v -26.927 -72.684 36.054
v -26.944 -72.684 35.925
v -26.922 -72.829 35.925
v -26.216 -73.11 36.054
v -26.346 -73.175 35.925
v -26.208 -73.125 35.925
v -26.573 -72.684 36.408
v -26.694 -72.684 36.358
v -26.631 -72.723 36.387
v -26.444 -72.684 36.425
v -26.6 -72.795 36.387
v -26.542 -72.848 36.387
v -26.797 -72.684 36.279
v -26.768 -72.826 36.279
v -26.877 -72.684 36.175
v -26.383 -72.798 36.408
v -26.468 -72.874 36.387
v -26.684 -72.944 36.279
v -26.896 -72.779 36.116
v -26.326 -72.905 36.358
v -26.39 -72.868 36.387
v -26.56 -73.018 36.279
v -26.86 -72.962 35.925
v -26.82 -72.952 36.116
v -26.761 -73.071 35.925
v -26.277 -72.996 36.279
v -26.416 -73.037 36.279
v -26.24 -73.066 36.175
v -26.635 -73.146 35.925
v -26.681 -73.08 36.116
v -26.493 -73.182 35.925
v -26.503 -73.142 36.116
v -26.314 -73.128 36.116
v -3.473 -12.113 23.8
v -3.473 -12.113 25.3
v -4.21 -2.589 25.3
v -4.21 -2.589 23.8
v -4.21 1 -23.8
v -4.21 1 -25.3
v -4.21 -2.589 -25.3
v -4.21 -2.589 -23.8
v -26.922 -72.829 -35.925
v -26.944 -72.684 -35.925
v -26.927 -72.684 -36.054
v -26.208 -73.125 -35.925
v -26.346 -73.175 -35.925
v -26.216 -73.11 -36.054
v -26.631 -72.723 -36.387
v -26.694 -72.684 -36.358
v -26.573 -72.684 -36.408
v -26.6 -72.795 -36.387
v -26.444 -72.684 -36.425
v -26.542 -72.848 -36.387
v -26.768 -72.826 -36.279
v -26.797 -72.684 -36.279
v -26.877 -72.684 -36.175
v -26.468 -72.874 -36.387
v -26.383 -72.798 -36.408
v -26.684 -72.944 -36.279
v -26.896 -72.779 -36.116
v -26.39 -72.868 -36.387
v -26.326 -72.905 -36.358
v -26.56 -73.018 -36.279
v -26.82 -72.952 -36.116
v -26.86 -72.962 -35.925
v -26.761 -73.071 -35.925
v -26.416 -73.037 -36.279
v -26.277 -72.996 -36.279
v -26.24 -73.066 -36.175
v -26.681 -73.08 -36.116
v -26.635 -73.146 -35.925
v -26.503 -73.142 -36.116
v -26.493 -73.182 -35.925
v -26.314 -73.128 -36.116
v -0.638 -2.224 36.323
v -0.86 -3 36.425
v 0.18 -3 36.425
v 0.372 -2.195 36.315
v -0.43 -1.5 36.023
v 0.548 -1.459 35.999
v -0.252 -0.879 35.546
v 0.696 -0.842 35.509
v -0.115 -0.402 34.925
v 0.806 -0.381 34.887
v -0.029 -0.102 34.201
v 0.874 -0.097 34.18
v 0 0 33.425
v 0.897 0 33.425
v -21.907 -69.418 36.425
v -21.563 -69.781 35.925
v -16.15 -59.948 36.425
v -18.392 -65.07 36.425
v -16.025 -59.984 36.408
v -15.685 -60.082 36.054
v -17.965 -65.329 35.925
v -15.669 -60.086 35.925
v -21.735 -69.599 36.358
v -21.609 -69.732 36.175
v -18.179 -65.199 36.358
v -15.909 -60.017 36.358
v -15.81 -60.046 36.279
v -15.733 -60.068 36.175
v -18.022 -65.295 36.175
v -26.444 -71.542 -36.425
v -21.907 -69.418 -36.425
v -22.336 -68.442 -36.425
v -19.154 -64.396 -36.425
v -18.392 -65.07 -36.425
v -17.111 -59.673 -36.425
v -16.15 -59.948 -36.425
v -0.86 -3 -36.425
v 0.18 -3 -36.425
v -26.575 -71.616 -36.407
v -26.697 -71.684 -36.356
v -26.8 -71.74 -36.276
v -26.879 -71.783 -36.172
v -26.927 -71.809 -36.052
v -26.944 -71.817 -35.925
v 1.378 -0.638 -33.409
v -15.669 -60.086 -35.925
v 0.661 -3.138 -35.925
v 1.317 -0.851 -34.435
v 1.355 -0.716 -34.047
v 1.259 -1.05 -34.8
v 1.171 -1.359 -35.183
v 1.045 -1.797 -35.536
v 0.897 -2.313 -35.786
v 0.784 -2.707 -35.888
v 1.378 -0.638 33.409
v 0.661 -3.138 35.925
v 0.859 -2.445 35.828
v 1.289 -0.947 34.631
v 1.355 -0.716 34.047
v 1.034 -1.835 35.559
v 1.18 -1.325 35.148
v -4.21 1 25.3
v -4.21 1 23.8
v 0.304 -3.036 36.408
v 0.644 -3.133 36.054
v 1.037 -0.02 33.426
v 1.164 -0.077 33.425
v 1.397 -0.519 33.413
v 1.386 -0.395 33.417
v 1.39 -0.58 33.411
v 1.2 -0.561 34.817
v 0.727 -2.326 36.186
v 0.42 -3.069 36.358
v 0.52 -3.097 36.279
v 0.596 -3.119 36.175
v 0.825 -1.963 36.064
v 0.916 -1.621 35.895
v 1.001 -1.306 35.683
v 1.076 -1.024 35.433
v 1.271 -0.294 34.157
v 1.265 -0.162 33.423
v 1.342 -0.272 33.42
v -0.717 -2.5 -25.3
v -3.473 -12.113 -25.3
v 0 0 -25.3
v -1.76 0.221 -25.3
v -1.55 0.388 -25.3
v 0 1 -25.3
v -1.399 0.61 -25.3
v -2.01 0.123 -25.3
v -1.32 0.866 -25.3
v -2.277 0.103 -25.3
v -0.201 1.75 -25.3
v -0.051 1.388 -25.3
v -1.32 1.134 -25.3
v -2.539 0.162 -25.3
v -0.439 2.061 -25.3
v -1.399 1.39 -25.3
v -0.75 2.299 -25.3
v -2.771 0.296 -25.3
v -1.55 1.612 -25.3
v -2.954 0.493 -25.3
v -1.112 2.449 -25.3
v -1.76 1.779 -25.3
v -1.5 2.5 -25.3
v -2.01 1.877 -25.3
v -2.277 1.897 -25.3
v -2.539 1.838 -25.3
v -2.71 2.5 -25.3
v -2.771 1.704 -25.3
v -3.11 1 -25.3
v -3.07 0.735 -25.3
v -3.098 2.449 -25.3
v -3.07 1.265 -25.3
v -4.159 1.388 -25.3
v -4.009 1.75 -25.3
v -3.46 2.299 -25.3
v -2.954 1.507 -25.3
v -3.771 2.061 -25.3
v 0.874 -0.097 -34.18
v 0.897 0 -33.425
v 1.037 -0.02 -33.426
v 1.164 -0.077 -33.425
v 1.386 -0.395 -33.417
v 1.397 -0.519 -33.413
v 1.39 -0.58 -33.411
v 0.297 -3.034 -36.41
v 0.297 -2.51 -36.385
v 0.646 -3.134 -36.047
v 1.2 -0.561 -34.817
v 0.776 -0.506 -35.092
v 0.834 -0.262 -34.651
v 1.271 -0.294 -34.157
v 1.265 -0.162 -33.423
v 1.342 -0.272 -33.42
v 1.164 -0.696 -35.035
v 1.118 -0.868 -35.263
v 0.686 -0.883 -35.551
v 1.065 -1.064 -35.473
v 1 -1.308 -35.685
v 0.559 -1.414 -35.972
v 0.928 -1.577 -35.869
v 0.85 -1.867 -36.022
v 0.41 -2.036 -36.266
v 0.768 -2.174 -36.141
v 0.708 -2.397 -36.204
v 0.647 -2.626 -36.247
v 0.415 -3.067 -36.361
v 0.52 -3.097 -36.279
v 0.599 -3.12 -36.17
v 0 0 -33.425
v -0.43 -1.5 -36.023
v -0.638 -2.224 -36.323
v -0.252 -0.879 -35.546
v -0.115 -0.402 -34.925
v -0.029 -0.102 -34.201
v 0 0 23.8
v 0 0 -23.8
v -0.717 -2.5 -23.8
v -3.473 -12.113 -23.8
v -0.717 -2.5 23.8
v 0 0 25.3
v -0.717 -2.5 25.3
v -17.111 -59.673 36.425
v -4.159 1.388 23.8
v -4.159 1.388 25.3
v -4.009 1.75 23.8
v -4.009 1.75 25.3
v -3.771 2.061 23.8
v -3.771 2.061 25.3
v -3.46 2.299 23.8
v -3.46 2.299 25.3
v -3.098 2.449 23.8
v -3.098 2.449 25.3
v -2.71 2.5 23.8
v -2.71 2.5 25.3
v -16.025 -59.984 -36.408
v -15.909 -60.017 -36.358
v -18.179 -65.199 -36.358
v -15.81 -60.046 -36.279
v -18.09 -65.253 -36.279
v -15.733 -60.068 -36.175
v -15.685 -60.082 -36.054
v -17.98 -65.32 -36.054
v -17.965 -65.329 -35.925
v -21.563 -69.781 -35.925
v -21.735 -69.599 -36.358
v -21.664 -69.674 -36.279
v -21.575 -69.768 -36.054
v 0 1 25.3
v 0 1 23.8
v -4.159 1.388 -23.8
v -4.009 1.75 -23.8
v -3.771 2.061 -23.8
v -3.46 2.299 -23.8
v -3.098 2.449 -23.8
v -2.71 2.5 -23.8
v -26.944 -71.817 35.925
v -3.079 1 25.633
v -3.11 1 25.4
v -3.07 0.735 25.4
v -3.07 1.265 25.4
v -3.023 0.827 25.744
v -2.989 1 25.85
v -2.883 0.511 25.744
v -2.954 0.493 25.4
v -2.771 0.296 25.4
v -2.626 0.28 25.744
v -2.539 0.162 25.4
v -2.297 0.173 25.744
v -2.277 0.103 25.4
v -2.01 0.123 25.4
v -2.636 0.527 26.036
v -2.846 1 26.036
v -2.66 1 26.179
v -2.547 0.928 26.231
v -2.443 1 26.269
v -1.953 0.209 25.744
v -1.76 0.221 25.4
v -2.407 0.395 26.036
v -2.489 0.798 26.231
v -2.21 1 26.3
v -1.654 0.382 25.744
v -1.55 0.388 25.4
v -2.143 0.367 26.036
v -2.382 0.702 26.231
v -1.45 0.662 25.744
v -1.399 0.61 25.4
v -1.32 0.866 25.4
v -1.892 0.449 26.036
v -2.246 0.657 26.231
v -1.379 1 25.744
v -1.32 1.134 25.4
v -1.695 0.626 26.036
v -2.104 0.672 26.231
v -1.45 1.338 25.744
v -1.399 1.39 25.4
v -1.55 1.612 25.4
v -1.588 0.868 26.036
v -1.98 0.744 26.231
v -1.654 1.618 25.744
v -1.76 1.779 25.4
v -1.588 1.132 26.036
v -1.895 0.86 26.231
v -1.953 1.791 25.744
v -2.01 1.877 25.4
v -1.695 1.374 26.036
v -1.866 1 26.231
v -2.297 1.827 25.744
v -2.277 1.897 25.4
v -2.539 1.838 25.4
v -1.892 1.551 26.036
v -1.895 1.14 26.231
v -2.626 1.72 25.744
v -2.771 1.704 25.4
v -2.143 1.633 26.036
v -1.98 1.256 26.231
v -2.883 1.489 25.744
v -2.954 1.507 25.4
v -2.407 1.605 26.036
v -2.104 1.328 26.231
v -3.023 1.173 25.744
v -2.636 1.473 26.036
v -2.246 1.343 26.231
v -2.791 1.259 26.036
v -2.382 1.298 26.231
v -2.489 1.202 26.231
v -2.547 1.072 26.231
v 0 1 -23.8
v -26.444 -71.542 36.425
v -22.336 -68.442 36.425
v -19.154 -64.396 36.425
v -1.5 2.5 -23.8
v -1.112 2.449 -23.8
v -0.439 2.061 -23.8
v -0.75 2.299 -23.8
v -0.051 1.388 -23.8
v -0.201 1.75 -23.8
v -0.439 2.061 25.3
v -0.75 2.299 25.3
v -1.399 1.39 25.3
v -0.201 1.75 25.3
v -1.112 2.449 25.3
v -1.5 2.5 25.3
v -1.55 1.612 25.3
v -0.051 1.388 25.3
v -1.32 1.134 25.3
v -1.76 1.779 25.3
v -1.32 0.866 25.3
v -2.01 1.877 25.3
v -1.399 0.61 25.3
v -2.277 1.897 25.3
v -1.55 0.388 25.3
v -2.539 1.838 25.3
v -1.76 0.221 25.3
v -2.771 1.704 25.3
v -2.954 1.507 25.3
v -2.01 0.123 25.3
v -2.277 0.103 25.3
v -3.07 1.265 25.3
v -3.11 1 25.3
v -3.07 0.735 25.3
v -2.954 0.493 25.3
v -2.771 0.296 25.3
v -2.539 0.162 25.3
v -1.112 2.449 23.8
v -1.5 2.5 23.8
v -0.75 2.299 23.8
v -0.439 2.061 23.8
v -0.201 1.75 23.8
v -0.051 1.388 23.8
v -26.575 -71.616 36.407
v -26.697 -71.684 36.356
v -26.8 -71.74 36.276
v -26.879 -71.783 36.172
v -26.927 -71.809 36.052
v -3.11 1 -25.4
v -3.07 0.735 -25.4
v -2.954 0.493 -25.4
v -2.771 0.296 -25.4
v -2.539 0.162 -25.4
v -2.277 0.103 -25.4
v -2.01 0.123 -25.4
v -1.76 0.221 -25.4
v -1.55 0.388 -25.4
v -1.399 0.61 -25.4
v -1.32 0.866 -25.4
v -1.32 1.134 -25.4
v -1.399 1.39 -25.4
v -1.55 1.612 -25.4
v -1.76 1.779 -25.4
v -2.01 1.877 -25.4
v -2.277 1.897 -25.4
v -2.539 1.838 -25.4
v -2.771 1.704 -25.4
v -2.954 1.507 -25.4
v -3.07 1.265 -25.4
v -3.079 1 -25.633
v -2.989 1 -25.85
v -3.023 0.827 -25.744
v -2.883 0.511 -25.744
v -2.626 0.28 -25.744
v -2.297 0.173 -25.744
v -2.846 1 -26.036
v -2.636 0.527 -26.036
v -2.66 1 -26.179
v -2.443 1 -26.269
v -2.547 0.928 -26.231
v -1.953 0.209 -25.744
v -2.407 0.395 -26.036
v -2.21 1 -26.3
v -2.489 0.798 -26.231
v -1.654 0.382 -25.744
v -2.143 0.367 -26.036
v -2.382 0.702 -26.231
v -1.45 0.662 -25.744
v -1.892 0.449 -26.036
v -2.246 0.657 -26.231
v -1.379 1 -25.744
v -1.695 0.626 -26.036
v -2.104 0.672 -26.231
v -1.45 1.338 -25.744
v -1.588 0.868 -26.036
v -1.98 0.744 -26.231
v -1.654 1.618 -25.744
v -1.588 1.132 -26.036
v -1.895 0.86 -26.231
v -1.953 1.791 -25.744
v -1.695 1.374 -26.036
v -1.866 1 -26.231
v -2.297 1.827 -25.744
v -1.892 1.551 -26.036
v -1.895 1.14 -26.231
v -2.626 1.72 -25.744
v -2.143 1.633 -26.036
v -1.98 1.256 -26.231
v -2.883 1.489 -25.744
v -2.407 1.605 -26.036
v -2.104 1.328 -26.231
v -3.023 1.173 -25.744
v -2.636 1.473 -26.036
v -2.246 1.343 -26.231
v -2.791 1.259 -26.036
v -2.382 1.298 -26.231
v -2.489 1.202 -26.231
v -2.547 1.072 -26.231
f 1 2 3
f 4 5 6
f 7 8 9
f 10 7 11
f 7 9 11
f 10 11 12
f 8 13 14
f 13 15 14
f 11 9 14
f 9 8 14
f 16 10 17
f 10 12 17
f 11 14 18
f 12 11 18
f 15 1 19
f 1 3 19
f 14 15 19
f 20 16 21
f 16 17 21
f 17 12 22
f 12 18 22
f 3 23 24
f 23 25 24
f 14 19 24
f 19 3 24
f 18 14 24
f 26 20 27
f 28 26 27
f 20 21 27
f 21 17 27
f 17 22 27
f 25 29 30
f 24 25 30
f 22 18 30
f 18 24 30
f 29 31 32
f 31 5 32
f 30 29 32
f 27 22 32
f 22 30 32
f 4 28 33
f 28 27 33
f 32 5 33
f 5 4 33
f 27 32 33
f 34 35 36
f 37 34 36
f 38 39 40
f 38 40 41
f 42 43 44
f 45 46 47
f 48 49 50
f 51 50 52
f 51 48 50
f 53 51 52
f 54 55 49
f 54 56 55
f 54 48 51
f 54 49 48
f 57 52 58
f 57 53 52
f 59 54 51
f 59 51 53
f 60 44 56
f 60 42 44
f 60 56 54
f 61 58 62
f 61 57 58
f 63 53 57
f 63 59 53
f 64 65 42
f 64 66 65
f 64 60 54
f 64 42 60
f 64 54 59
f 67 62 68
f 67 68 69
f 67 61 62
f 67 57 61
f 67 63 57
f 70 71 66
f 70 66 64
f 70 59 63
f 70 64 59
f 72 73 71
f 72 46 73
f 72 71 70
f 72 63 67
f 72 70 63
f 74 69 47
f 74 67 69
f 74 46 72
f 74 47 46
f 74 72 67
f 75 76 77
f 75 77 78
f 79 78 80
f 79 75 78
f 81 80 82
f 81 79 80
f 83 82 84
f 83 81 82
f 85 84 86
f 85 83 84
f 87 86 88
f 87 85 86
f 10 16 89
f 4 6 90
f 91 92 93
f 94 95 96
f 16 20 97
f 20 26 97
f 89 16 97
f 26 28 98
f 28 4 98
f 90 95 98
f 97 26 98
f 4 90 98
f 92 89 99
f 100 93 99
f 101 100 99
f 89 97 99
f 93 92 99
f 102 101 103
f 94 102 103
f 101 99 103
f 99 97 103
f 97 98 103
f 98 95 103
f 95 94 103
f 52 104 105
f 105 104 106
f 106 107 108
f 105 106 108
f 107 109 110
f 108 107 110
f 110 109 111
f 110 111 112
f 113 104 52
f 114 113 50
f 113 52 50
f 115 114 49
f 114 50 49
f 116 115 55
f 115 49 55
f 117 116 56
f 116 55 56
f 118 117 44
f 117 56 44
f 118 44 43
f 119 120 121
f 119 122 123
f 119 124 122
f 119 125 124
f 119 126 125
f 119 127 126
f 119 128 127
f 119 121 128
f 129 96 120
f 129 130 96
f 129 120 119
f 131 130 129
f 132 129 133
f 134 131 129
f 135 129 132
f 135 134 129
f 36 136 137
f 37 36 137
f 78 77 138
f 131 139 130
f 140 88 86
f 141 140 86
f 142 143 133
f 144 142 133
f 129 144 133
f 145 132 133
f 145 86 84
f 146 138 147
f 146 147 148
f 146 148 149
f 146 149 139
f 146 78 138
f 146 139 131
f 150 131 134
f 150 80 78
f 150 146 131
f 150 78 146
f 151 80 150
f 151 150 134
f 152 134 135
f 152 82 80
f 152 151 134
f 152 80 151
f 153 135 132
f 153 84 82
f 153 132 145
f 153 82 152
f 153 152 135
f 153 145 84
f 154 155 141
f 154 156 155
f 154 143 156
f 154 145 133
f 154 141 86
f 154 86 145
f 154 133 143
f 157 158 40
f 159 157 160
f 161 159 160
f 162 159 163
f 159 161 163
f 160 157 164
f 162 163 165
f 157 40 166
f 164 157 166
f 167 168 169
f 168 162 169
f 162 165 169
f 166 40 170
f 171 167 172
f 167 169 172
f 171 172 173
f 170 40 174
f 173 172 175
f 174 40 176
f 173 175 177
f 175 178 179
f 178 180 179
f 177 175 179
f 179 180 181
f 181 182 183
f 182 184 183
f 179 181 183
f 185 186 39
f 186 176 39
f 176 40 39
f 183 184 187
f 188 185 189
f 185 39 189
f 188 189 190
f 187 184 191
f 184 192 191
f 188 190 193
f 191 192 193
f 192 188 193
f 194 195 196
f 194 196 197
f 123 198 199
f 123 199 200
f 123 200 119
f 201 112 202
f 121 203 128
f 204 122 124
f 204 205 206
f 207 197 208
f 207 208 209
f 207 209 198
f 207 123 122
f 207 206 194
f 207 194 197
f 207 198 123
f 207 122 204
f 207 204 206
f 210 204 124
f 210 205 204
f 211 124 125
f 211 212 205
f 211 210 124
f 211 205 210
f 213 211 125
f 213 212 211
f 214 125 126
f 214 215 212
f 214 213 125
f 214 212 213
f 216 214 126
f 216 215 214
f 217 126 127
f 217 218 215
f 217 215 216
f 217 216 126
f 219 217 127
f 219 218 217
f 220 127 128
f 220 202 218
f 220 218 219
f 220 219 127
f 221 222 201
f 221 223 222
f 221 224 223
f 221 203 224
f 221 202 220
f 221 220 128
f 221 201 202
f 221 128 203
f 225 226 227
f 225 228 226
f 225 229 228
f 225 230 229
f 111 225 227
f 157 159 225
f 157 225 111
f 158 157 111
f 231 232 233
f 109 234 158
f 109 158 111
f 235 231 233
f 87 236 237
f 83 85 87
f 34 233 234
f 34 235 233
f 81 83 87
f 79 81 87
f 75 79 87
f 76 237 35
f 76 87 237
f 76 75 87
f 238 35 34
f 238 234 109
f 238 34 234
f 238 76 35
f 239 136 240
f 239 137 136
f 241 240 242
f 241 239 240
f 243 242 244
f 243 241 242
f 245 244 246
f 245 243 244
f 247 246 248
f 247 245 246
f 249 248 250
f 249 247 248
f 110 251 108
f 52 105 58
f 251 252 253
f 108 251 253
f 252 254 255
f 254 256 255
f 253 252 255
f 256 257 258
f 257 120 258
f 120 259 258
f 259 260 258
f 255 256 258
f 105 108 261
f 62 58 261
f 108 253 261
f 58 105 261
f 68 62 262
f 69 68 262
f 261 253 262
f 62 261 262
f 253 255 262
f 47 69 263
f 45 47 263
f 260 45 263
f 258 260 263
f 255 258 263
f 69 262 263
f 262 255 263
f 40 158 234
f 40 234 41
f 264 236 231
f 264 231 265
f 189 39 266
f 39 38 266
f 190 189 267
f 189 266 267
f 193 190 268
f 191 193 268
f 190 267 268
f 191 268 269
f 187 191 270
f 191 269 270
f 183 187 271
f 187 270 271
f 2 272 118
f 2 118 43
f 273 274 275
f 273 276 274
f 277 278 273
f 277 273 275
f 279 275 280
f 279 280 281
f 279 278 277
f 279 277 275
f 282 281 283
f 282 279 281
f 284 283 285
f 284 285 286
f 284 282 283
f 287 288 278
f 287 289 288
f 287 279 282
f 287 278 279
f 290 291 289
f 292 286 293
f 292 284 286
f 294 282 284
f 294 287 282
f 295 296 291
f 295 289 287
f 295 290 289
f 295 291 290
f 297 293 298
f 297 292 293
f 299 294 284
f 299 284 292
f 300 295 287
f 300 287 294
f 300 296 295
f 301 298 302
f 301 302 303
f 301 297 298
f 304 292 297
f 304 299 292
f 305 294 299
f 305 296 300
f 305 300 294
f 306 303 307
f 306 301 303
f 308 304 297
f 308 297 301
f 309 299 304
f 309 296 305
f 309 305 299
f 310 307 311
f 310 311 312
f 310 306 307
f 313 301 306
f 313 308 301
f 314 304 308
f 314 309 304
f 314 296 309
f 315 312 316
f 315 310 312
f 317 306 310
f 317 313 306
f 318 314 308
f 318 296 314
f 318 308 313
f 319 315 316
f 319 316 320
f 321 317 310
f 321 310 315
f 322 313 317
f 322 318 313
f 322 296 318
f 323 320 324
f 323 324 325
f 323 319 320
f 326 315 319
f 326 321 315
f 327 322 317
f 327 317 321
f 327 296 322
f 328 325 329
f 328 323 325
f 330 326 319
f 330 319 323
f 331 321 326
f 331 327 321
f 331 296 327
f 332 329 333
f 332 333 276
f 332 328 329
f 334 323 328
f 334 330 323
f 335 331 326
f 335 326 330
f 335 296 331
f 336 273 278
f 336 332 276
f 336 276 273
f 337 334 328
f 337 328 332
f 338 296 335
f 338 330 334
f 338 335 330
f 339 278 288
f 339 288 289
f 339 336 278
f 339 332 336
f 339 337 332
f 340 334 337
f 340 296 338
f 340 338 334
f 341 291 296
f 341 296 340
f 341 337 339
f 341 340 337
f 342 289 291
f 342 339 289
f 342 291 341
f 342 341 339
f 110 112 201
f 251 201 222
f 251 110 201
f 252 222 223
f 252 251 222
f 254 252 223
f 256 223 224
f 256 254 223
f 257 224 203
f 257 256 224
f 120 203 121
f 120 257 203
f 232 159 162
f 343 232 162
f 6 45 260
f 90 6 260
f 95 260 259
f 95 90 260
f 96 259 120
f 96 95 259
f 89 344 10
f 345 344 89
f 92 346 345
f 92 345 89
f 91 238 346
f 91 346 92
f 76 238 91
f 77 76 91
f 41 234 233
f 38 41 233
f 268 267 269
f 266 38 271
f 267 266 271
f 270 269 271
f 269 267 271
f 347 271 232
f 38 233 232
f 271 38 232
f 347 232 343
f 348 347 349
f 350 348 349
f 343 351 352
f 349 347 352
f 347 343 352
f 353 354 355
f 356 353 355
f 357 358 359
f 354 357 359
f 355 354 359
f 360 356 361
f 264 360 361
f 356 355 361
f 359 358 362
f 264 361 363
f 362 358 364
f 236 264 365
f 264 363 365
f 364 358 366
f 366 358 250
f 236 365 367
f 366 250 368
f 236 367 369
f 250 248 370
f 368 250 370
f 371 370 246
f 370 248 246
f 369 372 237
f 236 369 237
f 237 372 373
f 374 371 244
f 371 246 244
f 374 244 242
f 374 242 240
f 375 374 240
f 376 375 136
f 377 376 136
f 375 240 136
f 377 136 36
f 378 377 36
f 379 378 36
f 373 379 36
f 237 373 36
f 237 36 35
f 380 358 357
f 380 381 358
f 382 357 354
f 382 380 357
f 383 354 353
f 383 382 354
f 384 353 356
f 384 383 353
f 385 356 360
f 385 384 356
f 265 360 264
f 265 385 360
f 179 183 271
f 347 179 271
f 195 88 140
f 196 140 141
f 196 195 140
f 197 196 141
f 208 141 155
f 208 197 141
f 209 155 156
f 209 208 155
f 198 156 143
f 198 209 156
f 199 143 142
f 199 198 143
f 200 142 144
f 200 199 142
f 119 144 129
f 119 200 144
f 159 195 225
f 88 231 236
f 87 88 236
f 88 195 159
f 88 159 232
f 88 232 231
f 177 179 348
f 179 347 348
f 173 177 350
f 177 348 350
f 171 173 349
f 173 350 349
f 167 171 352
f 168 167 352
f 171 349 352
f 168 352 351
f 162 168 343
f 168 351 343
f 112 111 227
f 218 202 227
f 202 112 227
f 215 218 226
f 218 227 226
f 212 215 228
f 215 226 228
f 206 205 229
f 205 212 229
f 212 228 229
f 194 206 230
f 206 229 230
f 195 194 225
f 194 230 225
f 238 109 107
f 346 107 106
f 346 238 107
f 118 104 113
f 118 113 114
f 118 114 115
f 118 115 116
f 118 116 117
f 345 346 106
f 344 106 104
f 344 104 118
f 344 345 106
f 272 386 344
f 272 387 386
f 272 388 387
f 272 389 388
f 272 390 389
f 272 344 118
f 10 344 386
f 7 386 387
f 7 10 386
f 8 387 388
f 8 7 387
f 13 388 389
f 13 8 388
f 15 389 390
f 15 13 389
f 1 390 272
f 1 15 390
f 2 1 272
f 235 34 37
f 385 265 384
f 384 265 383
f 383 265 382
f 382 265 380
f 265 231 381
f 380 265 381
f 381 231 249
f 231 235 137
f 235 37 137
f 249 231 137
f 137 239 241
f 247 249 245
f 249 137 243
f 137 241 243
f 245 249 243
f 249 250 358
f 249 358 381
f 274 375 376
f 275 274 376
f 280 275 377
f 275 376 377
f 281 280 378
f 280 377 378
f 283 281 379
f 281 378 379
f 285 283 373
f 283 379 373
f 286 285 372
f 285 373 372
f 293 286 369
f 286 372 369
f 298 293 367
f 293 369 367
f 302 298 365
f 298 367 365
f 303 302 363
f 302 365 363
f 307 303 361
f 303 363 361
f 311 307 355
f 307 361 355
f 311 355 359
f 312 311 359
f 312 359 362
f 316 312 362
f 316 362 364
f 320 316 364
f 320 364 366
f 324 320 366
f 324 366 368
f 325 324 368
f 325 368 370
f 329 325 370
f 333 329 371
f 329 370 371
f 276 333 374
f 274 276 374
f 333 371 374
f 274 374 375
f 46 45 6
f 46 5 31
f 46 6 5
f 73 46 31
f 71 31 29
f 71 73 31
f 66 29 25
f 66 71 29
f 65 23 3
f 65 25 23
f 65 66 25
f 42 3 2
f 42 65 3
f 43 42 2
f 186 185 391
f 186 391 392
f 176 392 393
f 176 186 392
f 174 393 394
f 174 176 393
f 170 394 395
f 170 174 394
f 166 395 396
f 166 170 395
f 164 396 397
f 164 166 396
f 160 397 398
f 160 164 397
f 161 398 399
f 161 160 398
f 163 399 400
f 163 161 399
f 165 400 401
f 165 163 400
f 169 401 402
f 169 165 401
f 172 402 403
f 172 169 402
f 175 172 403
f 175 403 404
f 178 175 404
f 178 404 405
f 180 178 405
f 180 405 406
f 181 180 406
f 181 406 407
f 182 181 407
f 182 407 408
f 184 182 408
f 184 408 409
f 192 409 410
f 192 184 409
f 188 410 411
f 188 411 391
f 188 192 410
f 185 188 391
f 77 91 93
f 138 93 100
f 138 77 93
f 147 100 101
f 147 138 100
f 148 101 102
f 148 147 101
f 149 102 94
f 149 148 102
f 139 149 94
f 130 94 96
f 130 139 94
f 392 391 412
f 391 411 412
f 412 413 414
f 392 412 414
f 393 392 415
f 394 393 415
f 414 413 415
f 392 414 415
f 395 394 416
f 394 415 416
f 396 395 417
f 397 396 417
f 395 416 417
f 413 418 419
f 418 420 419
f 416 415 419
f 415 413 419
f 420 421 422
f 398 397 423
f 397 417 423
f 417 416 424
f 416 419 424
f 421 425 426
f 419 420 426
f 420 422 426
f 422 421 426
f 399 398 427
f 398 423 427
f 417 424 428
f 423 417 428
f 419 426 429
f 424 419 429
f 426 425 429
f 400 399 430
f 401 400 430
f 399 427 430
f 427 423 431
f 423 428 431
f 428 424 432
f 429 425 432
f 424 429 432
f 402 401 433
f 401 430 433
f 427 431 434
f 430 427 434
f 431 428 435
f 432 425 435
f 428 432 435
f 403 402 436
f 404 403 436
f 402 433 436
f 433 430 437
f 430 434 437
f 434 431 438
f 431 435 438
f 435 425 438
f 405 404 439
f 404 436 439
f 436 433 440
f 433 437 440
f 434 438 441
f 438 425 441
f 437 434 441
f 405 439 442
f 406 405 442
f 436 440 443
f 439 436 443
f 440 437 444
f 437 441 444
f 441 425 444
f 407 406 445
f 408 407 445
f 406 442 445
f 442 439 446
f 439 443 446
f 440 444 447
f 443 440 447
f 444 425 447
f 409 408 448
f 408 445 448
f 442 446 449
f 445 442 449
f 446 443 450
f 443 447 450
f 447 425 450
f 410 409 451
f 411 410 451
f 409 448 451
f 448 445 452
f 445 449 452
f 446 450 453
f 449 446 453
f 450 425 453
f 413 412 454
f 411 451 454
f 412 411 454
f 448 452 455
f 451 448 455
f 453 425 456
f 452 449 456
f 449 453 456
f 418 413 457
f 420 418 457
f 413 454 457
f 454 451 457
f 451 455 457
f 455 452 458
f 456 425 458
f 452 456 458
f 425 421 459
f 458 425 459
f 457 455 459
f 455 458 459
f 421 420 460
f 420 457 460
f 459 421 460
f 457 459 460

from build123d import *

# Parameters (mm, degrees)
BOSS_EXTRUDE1_DEPTH   = 36.425
CUT_EXTRUDE1_DEPTH    = 110.090212662
CUT_EXTRUDE2_DEPTH    = 109.098783751
FILLET1_R             = 3
BOSS_EXTRUDE12_REACH  = 92.552
BOSS_EXTRUDE12_START  = -4.21
SKETCH27_W            = 1.5
SKETCH27_H            = 5
CUT_EXTRUDE9_REACH    = 101.691
SKETCH30_W            = 0.716863464
SKETCH30_H            = 2.5
SKETCH31_R            = 0.9
BOSS_EXTRUDE13_DEPTH  = 1
FILLET9_R             = 1.5
FILLET10_R            = 1.5
FILLET11_R            = 0.9
FILLET9_OF_MIRROR4_R  = 1.5
FILLET10_OF_MIRROR4_R = 1.5
FILLET11_OF_MIRROR4_R = 0.9
FILLET12_R            = 0.5


with BuildPart() as part:
    # Sketch1 → Boss-Extrude1 (new, symmetric)
    with BuildSketch(Plane.XY):
        with BuildLine():
            Line((0, 0), (-17.110884891, -59.672747116))
            ThreePointArc((-17.110884891, -59.672747116), (-22.347799076, -68.454296451), (-31.240591359, -73.5))
            Line((-31.240591359, -73.5), (-30.858426801, -74.9505))
            ThreePointArc((-30.858426801, -74.9505), (-21.298675096, -69.526368685), (-15.668992347, -60.08620315))
            Line((-15.668992347, -60.08620315), (1.441892544, -0.413456034))
            Line((1.441892544, -0.413456034), (1.560449154, 0))
            Line((1.560449154, 0), (0, 0))
        make_face()
    extrude(amount=BOSS_EXTRUDE1_DEPTH, both=True)

    # Sketch2 → Cut-Extrude1 (cut, through all)
    with BuildSketch(Plane.XY.offset(36.425)):
        with BuildLine():
            Line((-31.240591359, -73.5), (-26.943866684, -73.5))
            ThreePointArc((-26.943866684, -73.5), (-28.865857957, -74.320486174), (-30.858426801, -74.9505))
            Line((-30.858426801, -74.9505), (-31.240591359, -73.5))
        make_face()
    extrude(amount=-CUT_EXTRUDE1_DEPTH, mode=Mode.SUBTRACT)

    # Sketch3 → Cut-Extrude2 (cut, through all)
    with BuildSketch(Plane.XY.offset(36.425)):
        with BuildLine():
            Line((-26.943866684, -73.5), (-31.240591359, -73.5))
            ThreePointArc((-31.240591359, -73.5), (-29.043541661, -72.783058785), (-26.943866684, -71.817451685))
            Line((-26.943866684, -71.817451685), (-26.943866684, -73.5))
        make_face()
    extrude(amount=-CUT_EXTRUDE2_DEPTH, mode=Mode.SUBTRACT)

    # Fillet1
    fillet1_edges = [part.edges().sort_by_distance(p)[0] for p in [
        (0.780224577, 0, 36.425),
        (0.780224577, 0, -36.425),
    ]]
    fillet(fillet1_edges, radius=FILLET1_R)

    # Boss-Extrude12: up to this plane
    boss_extrude12_end = Plane(origin=(0, 0, 36.425), z_dir=(0.9612616959383179, -0.2756373558170027, 0))
    # Sketch27 → Boss-Extrude12 (add, up to the surface)
    with BuildSketch(Plane(origin=(0, 0, 0), x_dir=(0, 0, -1), z_dir=(1, 0, 0)).offset(BOSS_EXTRUDE12_START), mode=Mode.PRIVATE) as boss_extrude12_sk1:
        with Locations((-24.55, 0)):
            Rectangle(SKETCH27_W, SKETCH27_H)
    boss_extrude12_tool1 = split(extrude(boss_extrude12_sk1.sketch, amount=BOSS_EXTRUDE12_REACH, mode=Mode.PRIVATE), bisect_by=boss_extrude12_end, keep=Keep.BOTH, mode=Mode.PRIVATE)
    boss_extrude12 = boss_extrude12_tool1.solids().sort_by_distance((-4.21, 0, 24.55))[0]
    add(boss_extrude12)

    # Sketch30 → Cut-Extrude9 (cut, up to next)
    with BuildSketch(Plane.XY.offset(25.3), mode=Mode.PRIVATE) as cut_extrude9_sk1:
        with Locations((0.358431732, 1.25)):
            Rectangle(SKETCH30_W, SKETCH30_H)
    cut_extrude9_tool1 = extrude(cut_extrude9_sk1.sketch, amount=-CUT_EXTRUDE9_REACH, mode=Mode.PRIVATE) & part.part
    cut_extrude9 = cut_extrude9_tool1.solids().sort_by_distance((0.358432, 1.25, 25.3))[0]
    add(cut_extrude9, mode=Mode.SUBTRACT)

    # Sketch31 → Boss-Extrude13 (add)
    with BuildSketch(Plane.XY.offset(25.3)):
        with Locations(Location((-2.21, 1, 0), (0, 0, 180))):
            Circle(SKETCH31_R)
    boss_extrude13 = extrude(amount=BOSS_EXTRUDE13_DEPTH)

    # Fillet9
    fillet9_edges = [part.edges().sort_by_distance(p)[0] for p in [
        (-4.21, 2.5, 24.55),
    ]]
    fillet(fillet9_edges, radius=FILLET9_R)

    # Fillet10
    fillet10_edges = [part.edges().sort_by_distance(p)[0] for p in [
        (0, 2.5, 24.55),
    ]]
    fillet(fillet10_edges, radius=FILLET10_R)

    # Fillet11
    fillet11_edges = [part.edges().sort_by_distance(p)[0] for p in [
        (-1.31, 1, 26.3),
    ]]
    fillet(fillet11_edges, radius=FILLET11_R)

    # Mirror4: Boss-Extrude12, Cut-Extrude9, Boss-Extrude13 across plane
    add(boss_extrude12.mirror(Plane.XY))
    add(cut_extrude9.mirror(Plane.XY), mode=Mode.SUBTRACT)
    add(boss_extrude13.mirror(Plane.XY))

    # Fillet9 of Mirror4
    fillet9_of_mirror4_edges = [part.edges().sort_by_distance(p)[0] for p in [
        (-4.21, 2.5, -24.55),
    ]]
    fillet(fillet9_of_mirror4_edges, radius=FILLET9_OF_MIRROR4_R)

    # Fillet10 of Mirror4
    fillet10_of_mirror4_edges = [part.edges().sort_by_distance(p)[0] for p in [
        (0, 2.5, -24.55),
    ]]
    fillet(fillet10_of_mirror4_edges, radius=FILLET10_OF_MIRROR4_R)

    # Fillet11 of Mirror4
    fillet11_of_mirror4_edges = [part.edges().sort_by_distance(p)[0] for p in [
        (-1.31, 1, -26.3),
    ]]
    fillet(fillet11_of_mirror4_edges, radius=FILLET11_OF_MIRROR4_R)

    # Fillet12
    fillet12_edges = [part.edges().sort_by_distance(p)[0] for p in [
        (-7.484389675, -31.543101575, 36.425),
        (-19.877867178, -67.993869785, -36.425),
        (-19.877867178, -67.993869785, 36.425),
        (-26.943866684, -73.5, 0),
        (-26.943866684, -72.658725842, -36.425),
        (-26.943866684, -72.658725842, 36.425),
        (1.560449154, 0, 0),
        (1.302457732, -0.899723012, 35.567156991),
        (1.302457732, -0.899723012, -35.567156991),
        (-7.484389675, -31.543101575, -36.425),
    ]]
    fillet(fillet12_edges, radius=FILLET12_R)

    # Chamfer1
    # the kernel refuses this chamfer: 10, 3.5 mm, written as the material it adds along each edge
    with BuildSketch(Plane(origin=(-0.716863464, -2.5, 25.3), x_dir=(-0.26268080042718955, -0.9648827892997839, 0), z_dir=(0, 0, -1))) as chamfer1_piece_1_section:
        with BuildLine():
            Line((10.375794366, 0), (0.542683512, 3.511617253))
            Line((0.542683512, 3.511617253), (0.349706955, 3.564153413))
            ThreePointArc((0.349706955, 3.564153413), (0.270766903, 1.755965125), (-0.192976558, 0.05253616))
            Line((-0.192976558, 0.05253616), (0.00269055, -0.199981902))
            ThreePointArc((0.00269055, -0.199981902), (5.189648845, -0.130196738), (10.378484916, -0.199981902))
            Line((10.378484916, -0.199981902), (10.375794366, 0))
        make_face()
    chamfer1_piece_1 = extrude(amount=1.5, mode=Mode.PRIVATE)
    chamfer1_piece_1 = split(chamfer1_piece_1, bisect_by=Plane(origin=(-4.21, -5.808119571, 24.55), z_dir=(1, 0, 0)), keep=Keep.TOP, mode=Mode.PRIVATE)
    add(chamfer1_piece_1)
    with BuildSketch(Plane(origin=(-0.716863464, -2.5, -25.3), x_dir=(-0.26268080042718955, -0.9648827892997839, 0), z_dir=(0, 0, 1))) as chamfer1_piece_2_section:
        with BuildLine():
            Line((10.375794366, 0), (0.542683512, -3.511617253))
            Line((0.542683512, -3.511617253), (0.349706955, -3.564153413))
            ThreePointArc((0.349706955, -3.564153413), (0.270766903, -1.755965125), (-0.192976558, -0.05253616))
            Line((-0.192976558, -0.05253616), (0.00269055, 0.199981902))
            ThreePointArc((0.00269055, 0.199981902), (5.189648845, 0.130196738), (10.378484916, 0.199981902))
            Line((10.378484916, 0.199981902), (10.375794366, 0))
        make_face()
    chamfer1_piece_2 = extrude(amount=1.5, mode=Mode.PRIVATE)
    chamfer1_piece_2 = split(chamfer1_piece_2, bisect_by=Plane(origin=(-4.21, -5.808119571, -24.55), z_dir=(1, 0, 0)), keep=Keep.TOP, mode=Mode.PRIVATE)
    add(chamfer1_piece_2)


solid = part.part
